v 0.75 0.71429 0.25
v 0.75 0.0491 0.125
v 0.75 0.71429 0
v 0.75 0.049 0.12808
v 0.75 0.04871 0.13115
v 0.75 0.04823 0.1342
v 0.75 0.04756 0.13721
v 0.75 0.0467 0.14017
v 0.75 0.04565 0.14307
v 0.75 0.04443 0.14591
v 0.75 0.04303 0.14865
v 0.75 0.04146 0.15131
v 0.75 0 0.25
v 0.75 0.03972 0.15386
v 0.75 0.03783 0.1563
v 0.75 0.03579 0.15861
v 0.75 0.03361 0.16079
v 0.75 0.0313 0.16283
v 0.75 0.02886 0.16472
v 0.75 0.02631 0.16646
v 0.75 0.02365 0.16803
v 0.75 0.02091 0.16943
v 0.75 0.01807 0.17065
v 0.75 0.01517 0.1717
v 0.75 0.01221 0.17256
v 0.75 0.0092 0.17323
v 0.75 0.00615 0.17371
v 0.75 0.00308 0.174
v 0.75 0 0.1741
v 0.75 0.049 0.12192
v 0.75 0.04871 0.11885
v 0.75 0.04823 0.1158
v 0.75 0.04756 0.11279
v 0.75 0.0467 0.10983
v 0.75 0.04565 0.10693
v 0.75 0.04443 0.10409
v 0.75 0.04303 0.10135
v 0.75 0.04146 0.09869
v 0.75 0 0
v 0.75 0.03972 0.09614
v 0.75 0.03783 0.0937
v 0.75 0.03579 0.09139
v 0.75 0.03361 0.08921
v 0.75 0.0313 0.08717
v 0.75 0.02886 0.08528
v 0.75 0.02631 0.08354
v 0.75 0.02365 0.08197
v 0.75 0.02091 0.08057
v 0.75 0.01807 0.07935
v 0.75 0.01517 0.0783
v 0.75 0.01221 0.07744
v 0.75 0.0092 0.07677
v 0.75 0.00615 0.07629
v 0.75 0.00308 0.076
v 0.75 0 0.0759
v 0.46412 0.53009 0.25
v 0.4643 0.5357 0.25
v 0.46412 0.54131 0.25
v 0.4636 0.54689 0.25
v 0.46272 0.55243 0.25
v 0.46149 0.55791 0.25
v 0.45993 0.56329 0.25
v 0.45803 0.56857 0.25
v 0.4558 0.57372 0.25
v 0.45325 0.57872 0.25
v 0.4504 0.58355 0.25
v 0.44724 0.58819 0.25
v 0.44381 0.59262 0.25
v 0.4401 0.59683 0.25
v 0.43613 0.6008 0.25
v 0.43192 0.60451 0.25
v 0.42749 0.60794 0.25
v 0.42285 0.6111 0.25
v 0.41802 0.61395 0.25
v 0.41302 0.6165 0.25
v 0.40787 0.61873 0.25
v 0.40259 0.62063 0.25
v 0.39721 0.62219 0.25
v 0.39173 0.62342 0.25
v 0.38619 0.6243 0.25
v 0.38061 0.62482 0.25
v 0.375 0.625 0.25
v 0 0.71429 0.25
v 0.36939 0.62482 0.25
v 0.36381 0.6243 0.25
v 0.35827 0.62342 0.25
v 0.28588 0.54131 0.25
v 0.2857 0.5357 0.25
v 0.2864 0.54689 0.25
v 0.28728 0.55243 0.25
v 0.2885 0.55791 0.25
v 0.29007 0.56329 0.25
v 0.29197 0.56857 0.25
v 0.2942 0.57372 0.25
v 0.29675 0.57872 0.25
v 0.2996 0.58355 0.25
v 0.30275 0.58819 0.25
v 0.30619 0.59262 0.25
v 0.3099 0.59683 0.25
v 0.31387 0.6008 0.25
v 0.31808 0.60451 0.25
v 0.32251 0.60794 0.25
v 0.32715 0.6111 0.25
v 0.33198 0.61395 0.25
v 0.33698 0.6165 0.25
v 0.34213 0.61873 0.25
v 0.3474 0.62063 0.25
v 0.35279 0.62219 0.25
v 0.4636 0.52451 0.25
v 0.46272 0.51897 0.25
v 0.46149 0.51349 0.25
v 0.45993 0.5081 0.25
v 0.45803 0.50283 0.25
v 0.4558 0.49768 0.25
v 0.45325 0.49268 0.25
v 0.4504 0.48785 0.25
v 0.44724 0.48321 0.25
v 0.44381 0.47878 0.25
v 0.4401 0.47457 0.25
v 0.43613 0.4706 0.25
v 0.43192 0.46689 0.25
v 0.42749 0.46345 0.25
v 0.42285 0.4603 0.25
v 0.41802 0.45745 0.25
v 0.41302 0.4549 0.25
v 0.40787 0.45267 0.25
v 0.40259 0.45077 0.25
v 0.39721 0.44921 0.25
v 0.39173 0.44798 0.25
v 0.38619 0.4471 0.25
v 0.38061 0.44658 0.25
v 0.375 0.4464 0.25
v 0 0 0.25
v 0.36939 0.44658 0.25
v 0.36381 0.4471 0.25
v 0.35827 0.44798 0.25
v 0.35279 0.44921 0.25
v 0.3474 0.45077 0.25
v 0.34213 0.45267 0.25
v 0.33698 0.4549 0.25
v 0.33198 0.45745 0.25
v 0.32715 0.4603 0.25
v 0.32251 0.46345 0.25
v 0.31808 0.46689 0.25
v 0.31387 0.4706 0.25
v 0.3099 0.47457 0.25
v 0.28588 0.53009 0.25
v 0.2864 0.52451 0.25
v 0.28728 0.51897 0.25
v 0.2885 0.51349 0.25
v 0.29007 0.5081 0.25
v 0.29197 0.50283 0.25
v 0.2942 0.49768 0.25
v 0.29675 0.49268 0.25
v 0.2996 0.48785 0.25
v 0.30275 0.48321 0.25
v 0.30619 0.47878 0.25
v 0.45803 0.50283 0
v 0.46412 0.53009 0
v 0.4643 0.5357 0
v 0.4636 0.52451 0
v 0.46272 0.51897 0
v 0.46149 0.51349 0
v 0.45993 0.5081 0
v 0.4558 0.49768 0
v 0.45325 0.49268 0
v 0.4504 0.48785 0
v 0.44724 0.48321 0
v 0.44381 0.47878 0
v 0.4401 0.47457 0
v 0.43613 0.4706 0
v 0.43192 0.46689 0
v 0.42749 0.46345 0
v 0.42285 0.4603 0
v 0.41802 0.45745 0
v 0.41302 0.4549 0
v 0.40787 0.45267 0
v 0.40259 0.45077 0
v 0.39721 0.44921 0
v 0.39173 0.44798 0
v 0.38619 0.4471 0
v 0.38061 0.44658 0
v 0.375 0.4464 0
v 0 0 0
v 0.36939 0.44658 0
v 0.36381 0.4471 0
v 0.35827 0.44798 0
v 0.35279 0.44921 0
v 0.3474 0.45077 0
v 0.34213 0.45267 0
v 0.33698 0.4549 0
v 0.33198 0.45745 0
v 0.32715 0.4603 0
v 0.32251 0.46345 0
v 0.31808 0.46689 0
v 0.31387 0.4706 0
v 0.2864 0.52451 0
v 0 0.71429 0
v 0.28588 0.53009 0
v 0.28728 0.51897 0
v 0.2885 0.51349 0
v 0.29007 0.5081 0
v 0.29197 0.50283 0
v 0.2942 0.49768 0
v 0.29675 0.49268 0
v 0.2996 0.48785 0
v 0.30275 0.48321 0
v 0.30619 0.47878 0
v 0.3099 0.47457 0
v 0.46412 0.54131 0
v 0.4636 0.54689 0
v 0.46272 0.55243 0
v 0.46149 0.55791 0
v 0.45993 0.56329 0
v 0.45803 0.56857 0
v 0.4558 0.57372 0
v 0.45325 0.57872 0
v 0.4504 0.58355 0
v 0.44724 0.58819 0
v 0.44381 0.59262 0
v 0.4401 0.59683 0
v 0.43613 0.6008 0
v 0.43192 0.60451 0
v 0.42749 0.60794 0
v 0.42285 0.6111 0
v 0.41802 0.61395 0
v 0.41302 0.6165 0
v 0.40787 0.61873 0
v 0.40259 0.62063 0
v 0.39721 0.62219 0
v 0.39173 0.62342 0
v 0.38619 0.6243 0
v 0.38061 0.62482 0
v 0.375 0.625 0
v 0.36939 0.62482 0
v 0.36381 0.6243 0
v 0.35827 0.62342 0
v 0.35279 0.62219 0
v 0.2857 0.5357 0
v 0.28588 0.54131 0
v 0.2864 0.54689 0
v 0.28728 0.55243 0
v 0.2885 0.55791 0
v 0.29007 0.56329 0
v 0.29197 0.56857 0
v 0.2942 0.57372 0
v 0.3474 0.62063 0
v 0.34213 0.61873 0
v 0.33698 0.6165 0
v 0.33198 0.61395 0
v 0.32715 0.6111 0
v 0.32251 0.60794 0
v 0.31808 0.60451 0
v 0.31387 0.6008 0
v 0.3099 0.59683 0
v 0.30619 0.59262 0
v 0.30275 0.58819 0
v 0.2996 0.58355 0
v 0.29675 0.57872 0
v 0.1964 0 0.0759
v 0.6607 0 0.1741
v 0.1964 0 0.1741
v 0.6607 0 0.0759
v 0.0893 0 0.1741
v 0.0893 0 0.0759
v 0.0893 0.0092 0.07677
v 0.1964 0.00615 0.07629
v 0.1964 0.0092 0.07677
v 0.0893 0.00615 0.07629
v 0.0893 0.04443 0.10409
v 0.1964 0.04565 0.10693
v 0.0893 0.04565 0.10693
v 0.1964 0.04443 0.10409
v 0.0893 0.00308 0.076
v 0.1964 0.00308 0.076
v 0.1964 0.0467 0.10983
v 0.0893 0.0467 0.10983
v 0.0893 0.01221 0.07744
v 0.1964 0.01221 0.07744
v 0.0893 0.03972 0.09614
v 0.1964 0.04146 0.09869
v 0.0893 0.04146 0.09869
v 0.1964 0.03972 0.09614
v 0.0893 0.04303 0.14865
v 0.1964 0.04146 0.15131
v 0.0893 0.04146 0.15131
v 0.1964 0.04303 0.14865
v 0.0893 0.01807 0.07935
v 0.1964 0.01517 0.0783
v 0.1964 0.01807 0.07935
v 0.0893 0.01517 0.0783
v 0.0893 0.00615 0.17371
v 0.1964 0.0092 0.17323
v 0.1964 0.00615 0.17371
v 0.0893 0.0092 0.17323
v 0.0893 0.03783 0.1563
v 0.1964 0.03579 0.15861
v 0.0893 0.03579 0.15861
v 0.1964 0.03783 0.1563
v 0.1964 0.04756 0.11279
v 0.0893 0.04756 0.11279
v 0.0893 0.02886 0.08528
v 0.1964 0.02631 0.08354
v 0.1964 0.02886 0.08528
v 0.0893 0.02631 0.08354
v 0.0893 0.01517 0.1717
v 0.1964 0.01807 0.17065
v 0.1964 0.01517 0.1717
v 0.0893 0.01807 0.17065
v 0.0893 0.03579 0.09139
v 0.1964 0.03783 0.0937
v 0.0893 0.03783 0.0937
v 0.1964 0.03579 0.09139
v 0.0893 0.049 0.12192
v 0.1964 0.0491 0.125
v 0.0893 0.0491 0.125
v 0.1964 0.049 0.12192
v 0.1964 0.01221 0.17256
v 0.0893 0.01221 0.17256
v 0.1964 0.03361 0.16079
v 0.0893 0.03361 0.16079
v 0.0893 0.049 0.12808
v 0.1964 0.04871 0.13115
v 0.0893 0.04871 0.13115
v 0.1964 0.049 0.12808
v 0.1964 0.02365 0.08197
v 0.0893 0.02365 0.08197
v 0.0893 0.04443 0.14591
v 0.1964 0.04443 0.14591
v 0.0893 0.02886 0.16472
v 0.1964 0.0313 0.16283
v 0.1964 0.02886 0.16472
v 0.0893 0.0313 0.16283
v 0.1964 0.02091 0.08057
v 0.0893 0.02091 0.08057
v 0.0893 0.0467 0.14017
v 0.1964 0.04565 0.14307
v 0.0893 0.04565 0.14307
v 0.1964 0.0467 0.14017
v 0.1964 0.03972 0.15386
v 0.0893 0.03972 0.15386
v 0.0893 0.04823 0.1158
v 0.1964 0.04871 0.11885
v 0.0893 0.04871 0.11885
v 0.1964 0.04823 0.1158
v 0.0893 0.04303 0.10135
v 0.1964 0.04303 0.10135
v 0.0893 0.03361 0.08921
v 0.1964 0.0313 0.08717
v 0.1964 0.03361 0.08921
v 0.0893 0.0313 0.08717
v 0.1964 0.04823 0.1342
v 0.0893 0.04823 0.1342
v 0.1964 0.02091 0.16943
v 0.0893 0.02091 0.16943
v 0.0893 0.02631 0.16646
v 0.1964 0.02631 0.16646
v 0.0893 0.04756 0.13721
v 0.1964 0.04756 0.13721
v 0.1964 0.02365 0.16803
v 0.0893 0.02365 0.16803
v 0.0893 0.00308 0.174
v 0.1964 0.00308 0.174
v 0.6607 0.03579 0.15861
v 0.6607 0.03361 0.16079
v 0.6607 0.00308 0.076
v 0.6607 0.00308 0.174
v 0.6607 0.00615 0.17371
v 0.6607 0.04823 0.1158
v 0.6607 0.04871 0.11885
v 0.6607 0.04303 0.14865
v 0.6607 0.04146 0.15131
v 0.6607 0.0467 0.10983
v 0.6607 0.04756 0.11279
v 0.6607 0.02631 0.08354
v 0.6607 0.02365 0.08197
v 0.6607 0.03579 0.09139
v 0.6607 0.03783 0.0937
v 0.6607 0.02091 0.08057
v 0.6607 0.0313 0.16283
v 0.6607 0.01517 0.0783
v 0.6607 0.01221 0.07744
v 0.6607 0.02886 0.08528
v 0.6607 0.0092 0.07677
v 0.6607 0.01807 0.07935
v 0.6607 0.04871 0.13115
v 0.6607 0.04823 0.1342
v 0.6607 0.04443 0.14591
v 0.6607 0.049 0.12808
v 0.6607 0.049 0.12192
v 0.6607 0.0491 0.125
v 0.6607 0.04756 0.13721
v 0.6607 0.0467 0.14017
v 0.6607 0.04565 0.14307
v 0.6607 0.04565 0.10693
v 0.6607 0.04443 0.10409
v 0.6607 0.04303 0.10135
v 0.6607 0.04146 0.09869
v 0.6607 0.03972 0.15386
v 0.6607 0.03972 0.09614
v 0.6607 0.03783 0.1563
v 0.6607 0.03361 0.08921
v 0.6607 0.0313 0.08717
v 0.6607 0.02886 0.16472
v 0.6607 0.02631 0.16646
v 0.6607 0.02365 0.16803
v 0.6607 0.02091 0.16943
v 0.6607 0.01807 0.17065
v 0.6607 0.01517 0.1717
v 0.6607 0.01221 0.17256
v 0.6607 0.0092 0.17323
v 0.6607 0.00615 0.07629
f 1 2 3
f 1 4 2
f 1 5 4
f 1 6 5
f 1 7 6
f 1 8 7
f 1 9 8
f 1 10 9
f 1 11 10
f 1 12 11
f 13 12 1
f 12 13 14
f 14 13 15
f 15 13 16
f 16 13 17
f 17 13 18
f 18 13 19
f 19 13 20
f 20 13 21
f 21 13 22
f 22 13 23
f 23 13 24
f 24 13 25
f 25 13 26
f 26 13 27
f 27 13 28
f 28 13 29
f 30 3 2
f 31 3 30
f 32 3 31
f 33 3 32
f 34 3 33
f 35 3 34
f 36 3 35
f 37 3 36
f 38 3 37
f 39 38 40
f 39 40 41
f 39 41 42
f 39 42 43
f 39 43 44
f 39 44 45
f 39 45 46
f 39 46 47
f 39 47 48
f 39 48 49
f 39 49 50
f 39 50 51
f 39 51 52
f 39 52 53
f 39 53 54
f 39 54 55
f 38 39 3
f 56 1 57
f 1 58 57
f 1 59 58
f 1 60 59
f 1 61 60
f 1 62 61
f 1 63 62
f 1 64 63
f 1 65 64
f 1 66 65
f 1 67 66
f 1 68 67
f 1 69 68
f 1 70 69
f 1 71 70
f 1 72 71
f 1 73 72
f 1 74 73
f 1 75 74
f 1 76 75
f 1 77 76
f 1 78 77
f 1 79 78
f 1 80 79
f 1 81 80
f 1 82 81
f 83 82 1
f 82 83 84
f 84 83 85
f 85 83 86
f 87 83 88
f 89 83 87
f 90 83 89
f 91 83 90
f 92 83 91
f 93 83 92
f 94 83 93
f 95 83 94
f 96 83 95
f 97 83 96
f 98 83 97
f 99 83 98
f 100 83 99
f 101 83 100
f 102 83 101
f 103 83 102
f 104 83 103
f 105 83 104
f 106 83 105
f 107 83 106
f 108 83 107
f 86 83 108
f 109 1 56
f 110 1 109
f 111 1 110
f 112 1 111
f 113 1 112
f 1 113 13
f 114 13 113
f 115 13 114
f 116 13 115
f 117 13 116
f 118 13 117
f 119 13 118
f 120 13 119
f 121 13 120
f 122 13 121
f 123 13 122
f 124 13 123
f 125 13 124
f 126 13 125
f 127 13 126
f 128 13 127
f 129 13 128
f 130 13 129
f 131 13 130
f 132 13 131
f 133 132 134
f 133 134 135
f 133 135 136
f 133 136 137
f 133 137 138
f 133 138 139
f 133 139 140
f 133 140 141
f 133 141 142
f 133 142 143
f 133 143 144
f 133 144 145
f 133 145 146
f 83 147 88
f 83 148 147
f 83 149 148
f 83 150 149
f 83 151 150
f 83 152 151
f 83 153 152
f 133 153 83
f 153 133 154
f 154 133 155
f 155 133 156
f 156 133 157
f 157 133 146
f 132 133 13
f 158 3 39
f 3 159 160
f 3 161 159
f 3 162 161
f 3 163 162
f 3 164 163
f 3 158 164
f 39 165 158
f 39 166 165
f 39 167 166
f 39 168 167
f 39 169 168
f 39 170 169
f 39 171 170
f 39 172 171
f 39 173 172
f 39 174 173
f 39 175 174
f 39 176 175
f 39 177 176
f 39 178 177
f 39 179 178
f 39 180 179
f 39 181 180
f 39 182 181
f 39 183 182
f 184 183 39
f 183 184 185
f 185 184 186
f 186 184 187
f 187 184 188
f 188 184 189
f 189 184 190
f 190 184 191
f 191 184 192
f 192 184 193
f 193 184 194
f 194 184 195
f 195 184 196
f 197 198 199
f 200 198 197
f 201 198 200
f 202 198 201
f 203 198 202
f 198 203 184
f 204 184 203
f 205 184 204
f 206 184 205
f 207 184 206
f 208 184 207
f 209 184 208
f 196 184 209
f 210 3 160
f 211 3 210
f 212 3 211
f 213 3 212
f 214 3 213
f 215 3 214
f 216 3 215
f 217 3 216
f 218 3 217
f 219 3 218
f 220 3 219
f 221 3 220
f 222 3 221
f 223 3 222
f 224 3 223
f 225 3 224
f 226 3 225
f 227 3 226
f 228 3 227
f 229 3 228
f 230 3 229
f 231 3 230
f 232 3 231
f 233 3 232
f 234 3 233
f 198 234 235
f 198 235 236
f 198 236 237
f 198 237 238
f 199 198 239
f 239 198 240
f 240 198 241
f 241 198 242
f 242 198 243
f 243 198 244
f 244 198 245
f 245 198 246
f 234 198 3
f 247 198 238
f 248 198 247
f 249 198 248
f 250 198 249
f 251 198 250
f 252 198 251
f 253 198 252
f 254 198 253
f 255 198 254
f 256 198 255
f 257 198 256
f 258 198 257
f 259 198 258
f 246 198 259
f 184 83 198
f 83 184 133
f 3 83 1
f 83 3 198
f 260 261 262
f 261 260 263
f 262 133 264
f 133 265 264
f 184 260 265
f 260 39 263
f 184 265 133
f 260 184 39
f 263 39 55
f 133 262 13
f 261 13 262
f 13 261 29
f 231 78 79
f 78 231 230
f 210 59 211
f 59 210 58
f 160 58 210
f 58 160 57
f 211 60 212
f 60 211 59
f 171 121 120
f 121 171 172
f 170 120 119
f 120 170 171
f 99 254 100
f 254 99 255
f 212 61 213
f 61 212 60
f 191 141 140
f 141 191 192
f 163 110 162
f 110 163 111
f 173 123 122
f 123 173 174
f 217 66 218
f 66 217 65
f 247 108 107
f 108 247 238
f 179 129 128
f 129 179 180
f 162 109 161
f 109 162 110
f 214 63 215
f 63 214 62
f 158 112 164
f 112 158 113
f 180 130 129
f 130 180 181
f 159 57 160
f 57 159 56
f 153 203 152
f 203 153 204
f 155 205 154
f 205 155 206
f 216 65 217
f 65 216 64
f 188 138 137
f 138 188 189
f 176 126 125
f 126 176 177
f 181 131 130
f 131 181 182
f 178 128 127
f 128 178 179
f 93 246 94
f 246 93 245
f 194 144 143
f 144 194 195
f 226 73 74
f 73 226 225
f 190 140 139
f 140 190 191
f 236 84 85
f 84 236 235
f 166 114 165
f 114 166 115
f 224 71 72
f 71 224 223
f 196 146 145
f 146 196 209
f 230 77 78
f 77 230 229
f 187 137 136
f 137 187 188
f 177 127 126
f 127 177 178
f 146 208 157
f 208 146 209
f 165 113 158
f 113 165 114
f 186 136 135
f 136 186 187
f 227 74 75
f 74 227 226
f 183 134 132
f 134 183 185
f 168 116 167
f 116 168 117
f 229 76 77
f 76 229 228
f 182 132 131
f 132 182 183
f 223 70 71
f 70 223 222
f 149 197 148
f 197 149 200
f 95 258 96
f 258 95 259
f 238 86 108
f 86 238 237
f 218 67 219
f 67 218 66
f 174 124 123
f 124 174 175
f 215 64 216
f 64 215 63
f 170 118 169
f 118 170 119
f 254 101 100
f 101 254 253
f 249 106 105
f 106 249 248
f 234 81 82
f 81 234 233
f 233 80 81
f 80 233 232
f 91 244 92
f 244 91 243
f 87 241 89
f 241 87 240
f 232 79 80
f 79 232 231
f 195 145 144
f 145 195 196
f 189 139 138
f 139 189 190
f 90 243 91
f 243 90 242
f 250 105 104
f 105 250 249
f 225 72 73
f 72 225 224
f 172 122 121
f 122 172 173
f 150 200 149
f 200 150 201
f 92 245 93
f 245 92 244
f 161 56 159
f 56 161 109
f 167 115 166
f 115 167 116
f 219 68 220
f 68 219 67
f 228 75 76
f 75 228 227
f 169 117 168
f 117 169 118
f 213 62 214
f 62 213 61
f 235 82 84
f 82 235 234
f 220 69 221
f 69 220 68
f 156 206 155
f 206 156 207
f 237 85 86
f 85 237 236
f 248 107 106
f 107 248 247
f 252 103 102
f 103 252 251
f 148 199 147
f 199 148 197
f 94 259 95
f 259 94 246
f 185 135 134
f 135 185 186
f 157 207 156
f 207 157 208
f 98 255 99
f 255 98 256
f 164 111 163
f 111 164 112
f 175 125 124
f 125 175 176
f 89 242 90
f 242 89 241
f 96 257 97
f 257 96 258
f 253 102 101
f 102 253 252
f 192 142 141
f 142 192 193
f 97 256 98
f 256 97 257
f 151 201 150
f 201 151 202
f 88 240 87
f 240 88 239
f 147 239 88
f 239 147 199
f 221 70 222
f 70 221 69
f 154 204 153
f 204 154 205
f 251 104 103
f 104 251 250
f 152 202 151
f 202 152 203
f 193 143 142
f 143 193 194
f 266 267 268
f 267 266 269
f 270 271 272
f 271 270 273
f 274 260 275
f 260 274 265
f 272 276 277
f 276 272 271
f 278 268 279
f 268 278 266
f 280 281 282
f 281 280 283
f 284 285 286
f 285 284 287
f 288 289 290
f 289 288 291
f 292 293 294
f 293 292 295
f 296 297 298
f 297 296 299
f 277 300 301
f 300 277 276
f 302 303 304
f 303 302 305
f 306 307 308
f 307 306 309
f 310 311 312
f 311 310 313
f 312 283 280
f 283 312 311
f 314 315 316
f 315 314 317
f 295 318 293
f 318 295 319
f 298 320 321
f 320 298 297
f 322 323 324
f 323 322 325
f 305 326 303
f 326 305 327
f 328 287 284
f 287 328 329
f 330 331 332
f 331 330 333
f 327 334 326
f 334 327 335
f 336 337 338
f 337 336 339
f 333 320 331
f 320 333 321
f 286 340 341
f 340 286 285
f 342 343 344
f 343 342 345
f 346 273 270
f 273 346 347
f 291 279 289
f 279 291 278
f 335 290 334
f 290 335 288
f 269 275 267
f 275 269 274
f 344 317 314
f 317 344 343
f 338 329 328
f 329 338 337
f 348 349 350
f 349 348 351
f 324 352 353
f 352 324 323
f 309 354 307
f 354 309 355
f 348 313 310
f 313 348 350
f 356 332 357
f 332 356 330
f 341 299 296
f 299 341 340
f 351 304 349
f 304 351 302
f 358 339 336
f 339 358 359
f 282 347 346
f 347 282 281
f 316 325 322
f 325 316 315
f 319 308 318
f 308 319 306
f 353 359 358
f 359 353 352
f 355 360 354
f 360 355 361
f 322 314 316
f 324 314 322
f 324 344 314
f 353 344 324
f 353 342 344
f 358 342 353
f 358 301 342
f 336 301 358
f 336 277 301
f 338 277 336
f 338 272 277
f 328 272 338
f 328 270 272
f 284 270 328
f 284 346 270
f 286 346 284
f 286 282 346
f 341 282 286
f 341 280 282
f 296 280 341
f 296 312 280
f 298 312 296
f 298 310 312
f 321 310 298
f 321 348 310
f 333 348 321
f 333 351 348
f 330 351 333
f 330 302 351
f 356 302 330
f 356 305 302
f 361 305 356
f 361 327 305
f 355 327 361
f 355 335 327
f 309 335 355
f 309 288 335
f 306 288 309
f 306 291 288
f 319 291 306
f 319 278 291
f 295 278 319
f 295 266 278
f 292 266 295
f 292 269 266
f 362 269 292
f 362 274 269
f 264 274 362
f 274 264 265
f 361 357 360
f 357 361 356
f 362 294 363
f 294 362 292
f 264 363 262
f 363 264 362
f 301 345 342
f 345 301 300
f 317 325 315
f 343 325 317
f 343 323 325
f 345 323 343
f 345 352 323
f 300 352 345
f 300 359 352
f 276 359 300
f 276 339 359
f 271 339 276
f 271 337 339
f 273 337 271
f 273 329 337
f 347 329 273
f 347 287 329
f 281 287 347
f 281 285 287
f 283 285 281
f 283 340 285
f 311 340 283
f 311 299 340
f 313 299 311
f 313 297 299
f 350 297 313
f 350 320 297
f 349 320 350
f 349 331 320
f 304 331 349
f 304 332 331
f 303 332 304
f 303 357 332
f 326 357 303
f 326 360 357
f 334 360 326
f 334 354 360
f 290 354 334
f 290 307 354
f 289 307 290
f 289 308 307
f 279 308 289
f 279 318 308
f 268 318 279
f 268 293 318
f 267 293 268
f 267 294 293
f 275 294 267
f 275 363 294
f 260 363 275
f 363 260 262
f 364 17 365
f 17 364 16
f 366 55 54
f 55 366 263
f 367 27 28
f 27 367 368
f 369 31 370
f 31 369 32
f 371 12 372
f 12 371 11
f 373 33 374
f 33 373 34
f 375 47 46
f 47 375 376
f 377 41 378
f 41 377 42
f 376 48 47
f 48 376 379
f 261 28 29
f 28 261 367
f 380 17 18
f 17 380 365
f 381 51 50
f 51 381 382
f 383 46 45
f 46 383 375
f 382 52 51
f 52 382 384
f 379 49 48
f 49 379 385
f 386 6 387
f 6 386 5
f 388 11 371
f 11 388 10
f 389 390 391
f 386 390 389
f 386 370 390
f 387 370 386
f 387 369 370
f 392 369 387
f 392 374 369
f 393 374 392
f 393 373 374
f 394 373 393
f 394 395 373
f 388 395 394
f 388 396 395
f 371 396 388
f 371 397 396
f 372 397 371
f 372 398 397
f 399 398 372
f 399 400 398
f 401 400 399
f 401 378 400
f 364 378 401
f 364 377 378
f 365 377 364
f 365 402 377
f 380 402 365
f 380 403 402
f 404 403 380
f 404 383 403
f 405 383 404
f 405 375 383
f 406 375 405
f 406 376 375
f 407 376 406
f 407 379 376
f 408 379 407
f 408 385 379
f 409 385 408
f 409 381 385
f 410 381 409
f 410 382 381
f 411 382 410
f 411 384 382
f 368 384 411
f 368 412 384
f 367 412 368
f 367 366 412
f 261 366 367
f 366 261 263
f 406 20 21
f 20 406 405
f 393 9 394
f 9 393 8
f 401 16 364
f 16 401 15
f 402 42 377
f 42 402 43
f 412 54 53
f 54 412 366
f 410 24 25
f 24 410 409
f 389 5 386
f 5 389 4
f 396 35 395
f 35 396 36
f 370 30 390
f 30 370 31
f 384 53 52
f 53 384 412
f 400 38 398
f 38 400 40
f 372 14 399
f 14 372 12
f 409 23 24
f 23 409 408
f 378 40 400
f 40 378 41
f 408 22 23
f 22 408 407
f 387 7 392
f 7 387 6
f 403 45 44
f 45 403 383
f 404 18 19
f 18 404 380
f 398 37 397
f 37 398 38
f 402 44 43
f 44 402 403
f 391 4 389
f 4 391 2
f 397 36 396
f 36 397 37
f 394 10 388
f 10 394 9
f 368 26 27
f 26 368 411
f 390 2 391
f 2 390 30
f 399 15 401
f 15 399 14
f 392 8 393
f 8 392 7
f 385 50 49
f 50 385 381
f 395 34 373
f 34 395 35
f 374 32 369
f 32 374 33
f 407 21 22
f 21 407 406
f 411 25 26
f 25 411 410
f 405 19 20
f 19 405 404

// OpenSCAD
// Parametric dimensions for the main block
block_length = 0.75;
block_width  = 0.714286;
block_height = 0.25;

// Upper through-hole (circular)
through_hole_radius = 0.0893;
through_hole_x      = 0.375;   // from left edge
through_hole_y      = 0.5357;  // from front edge

// Blind cylindrical cuts on front face (Y=0)
blind_hole_radius   = 0.0491;
blind_hole_depth    = 0.1071;   // into the body along Y
blind_hole_z_center = (0.0759 + 0.1741) / 2;  // 0.125, centered vertically
blind_hole1_x       = 0.0893;   // from left edge
blind_hole2_x       = 0.6607;   // from left edge

// Smoothness
$fn = 100;

// Main solid: rectangular block (base at Z=0, left at X=0, front at Y=0)
module main_block() {
    cube([block_length, block_width, block_height]);
}

// Upper through-hole: vertical cylinder removing full height
module through_hole() {
    translate([through_hole_x, through_hole_y, -0.005])
        cylinder(h = block_height + 0.01, r = through_hole_radius);
}

// Single blind hole on the front face, axis along Y
module blind_hole(x_pos) {
    translate([x_pos, 0, blind_hole_z_center])
        rotate([0, 90, 0])
            cylinder(h = blind_hole_depth, r = blind_hole_radius);
}

// Final model: subtract holes from block
difference() {
    main_block();
    through_hole();
    blind_hole(blind_hole1_x);
    blind_hole(blind_hole2_x);
}
